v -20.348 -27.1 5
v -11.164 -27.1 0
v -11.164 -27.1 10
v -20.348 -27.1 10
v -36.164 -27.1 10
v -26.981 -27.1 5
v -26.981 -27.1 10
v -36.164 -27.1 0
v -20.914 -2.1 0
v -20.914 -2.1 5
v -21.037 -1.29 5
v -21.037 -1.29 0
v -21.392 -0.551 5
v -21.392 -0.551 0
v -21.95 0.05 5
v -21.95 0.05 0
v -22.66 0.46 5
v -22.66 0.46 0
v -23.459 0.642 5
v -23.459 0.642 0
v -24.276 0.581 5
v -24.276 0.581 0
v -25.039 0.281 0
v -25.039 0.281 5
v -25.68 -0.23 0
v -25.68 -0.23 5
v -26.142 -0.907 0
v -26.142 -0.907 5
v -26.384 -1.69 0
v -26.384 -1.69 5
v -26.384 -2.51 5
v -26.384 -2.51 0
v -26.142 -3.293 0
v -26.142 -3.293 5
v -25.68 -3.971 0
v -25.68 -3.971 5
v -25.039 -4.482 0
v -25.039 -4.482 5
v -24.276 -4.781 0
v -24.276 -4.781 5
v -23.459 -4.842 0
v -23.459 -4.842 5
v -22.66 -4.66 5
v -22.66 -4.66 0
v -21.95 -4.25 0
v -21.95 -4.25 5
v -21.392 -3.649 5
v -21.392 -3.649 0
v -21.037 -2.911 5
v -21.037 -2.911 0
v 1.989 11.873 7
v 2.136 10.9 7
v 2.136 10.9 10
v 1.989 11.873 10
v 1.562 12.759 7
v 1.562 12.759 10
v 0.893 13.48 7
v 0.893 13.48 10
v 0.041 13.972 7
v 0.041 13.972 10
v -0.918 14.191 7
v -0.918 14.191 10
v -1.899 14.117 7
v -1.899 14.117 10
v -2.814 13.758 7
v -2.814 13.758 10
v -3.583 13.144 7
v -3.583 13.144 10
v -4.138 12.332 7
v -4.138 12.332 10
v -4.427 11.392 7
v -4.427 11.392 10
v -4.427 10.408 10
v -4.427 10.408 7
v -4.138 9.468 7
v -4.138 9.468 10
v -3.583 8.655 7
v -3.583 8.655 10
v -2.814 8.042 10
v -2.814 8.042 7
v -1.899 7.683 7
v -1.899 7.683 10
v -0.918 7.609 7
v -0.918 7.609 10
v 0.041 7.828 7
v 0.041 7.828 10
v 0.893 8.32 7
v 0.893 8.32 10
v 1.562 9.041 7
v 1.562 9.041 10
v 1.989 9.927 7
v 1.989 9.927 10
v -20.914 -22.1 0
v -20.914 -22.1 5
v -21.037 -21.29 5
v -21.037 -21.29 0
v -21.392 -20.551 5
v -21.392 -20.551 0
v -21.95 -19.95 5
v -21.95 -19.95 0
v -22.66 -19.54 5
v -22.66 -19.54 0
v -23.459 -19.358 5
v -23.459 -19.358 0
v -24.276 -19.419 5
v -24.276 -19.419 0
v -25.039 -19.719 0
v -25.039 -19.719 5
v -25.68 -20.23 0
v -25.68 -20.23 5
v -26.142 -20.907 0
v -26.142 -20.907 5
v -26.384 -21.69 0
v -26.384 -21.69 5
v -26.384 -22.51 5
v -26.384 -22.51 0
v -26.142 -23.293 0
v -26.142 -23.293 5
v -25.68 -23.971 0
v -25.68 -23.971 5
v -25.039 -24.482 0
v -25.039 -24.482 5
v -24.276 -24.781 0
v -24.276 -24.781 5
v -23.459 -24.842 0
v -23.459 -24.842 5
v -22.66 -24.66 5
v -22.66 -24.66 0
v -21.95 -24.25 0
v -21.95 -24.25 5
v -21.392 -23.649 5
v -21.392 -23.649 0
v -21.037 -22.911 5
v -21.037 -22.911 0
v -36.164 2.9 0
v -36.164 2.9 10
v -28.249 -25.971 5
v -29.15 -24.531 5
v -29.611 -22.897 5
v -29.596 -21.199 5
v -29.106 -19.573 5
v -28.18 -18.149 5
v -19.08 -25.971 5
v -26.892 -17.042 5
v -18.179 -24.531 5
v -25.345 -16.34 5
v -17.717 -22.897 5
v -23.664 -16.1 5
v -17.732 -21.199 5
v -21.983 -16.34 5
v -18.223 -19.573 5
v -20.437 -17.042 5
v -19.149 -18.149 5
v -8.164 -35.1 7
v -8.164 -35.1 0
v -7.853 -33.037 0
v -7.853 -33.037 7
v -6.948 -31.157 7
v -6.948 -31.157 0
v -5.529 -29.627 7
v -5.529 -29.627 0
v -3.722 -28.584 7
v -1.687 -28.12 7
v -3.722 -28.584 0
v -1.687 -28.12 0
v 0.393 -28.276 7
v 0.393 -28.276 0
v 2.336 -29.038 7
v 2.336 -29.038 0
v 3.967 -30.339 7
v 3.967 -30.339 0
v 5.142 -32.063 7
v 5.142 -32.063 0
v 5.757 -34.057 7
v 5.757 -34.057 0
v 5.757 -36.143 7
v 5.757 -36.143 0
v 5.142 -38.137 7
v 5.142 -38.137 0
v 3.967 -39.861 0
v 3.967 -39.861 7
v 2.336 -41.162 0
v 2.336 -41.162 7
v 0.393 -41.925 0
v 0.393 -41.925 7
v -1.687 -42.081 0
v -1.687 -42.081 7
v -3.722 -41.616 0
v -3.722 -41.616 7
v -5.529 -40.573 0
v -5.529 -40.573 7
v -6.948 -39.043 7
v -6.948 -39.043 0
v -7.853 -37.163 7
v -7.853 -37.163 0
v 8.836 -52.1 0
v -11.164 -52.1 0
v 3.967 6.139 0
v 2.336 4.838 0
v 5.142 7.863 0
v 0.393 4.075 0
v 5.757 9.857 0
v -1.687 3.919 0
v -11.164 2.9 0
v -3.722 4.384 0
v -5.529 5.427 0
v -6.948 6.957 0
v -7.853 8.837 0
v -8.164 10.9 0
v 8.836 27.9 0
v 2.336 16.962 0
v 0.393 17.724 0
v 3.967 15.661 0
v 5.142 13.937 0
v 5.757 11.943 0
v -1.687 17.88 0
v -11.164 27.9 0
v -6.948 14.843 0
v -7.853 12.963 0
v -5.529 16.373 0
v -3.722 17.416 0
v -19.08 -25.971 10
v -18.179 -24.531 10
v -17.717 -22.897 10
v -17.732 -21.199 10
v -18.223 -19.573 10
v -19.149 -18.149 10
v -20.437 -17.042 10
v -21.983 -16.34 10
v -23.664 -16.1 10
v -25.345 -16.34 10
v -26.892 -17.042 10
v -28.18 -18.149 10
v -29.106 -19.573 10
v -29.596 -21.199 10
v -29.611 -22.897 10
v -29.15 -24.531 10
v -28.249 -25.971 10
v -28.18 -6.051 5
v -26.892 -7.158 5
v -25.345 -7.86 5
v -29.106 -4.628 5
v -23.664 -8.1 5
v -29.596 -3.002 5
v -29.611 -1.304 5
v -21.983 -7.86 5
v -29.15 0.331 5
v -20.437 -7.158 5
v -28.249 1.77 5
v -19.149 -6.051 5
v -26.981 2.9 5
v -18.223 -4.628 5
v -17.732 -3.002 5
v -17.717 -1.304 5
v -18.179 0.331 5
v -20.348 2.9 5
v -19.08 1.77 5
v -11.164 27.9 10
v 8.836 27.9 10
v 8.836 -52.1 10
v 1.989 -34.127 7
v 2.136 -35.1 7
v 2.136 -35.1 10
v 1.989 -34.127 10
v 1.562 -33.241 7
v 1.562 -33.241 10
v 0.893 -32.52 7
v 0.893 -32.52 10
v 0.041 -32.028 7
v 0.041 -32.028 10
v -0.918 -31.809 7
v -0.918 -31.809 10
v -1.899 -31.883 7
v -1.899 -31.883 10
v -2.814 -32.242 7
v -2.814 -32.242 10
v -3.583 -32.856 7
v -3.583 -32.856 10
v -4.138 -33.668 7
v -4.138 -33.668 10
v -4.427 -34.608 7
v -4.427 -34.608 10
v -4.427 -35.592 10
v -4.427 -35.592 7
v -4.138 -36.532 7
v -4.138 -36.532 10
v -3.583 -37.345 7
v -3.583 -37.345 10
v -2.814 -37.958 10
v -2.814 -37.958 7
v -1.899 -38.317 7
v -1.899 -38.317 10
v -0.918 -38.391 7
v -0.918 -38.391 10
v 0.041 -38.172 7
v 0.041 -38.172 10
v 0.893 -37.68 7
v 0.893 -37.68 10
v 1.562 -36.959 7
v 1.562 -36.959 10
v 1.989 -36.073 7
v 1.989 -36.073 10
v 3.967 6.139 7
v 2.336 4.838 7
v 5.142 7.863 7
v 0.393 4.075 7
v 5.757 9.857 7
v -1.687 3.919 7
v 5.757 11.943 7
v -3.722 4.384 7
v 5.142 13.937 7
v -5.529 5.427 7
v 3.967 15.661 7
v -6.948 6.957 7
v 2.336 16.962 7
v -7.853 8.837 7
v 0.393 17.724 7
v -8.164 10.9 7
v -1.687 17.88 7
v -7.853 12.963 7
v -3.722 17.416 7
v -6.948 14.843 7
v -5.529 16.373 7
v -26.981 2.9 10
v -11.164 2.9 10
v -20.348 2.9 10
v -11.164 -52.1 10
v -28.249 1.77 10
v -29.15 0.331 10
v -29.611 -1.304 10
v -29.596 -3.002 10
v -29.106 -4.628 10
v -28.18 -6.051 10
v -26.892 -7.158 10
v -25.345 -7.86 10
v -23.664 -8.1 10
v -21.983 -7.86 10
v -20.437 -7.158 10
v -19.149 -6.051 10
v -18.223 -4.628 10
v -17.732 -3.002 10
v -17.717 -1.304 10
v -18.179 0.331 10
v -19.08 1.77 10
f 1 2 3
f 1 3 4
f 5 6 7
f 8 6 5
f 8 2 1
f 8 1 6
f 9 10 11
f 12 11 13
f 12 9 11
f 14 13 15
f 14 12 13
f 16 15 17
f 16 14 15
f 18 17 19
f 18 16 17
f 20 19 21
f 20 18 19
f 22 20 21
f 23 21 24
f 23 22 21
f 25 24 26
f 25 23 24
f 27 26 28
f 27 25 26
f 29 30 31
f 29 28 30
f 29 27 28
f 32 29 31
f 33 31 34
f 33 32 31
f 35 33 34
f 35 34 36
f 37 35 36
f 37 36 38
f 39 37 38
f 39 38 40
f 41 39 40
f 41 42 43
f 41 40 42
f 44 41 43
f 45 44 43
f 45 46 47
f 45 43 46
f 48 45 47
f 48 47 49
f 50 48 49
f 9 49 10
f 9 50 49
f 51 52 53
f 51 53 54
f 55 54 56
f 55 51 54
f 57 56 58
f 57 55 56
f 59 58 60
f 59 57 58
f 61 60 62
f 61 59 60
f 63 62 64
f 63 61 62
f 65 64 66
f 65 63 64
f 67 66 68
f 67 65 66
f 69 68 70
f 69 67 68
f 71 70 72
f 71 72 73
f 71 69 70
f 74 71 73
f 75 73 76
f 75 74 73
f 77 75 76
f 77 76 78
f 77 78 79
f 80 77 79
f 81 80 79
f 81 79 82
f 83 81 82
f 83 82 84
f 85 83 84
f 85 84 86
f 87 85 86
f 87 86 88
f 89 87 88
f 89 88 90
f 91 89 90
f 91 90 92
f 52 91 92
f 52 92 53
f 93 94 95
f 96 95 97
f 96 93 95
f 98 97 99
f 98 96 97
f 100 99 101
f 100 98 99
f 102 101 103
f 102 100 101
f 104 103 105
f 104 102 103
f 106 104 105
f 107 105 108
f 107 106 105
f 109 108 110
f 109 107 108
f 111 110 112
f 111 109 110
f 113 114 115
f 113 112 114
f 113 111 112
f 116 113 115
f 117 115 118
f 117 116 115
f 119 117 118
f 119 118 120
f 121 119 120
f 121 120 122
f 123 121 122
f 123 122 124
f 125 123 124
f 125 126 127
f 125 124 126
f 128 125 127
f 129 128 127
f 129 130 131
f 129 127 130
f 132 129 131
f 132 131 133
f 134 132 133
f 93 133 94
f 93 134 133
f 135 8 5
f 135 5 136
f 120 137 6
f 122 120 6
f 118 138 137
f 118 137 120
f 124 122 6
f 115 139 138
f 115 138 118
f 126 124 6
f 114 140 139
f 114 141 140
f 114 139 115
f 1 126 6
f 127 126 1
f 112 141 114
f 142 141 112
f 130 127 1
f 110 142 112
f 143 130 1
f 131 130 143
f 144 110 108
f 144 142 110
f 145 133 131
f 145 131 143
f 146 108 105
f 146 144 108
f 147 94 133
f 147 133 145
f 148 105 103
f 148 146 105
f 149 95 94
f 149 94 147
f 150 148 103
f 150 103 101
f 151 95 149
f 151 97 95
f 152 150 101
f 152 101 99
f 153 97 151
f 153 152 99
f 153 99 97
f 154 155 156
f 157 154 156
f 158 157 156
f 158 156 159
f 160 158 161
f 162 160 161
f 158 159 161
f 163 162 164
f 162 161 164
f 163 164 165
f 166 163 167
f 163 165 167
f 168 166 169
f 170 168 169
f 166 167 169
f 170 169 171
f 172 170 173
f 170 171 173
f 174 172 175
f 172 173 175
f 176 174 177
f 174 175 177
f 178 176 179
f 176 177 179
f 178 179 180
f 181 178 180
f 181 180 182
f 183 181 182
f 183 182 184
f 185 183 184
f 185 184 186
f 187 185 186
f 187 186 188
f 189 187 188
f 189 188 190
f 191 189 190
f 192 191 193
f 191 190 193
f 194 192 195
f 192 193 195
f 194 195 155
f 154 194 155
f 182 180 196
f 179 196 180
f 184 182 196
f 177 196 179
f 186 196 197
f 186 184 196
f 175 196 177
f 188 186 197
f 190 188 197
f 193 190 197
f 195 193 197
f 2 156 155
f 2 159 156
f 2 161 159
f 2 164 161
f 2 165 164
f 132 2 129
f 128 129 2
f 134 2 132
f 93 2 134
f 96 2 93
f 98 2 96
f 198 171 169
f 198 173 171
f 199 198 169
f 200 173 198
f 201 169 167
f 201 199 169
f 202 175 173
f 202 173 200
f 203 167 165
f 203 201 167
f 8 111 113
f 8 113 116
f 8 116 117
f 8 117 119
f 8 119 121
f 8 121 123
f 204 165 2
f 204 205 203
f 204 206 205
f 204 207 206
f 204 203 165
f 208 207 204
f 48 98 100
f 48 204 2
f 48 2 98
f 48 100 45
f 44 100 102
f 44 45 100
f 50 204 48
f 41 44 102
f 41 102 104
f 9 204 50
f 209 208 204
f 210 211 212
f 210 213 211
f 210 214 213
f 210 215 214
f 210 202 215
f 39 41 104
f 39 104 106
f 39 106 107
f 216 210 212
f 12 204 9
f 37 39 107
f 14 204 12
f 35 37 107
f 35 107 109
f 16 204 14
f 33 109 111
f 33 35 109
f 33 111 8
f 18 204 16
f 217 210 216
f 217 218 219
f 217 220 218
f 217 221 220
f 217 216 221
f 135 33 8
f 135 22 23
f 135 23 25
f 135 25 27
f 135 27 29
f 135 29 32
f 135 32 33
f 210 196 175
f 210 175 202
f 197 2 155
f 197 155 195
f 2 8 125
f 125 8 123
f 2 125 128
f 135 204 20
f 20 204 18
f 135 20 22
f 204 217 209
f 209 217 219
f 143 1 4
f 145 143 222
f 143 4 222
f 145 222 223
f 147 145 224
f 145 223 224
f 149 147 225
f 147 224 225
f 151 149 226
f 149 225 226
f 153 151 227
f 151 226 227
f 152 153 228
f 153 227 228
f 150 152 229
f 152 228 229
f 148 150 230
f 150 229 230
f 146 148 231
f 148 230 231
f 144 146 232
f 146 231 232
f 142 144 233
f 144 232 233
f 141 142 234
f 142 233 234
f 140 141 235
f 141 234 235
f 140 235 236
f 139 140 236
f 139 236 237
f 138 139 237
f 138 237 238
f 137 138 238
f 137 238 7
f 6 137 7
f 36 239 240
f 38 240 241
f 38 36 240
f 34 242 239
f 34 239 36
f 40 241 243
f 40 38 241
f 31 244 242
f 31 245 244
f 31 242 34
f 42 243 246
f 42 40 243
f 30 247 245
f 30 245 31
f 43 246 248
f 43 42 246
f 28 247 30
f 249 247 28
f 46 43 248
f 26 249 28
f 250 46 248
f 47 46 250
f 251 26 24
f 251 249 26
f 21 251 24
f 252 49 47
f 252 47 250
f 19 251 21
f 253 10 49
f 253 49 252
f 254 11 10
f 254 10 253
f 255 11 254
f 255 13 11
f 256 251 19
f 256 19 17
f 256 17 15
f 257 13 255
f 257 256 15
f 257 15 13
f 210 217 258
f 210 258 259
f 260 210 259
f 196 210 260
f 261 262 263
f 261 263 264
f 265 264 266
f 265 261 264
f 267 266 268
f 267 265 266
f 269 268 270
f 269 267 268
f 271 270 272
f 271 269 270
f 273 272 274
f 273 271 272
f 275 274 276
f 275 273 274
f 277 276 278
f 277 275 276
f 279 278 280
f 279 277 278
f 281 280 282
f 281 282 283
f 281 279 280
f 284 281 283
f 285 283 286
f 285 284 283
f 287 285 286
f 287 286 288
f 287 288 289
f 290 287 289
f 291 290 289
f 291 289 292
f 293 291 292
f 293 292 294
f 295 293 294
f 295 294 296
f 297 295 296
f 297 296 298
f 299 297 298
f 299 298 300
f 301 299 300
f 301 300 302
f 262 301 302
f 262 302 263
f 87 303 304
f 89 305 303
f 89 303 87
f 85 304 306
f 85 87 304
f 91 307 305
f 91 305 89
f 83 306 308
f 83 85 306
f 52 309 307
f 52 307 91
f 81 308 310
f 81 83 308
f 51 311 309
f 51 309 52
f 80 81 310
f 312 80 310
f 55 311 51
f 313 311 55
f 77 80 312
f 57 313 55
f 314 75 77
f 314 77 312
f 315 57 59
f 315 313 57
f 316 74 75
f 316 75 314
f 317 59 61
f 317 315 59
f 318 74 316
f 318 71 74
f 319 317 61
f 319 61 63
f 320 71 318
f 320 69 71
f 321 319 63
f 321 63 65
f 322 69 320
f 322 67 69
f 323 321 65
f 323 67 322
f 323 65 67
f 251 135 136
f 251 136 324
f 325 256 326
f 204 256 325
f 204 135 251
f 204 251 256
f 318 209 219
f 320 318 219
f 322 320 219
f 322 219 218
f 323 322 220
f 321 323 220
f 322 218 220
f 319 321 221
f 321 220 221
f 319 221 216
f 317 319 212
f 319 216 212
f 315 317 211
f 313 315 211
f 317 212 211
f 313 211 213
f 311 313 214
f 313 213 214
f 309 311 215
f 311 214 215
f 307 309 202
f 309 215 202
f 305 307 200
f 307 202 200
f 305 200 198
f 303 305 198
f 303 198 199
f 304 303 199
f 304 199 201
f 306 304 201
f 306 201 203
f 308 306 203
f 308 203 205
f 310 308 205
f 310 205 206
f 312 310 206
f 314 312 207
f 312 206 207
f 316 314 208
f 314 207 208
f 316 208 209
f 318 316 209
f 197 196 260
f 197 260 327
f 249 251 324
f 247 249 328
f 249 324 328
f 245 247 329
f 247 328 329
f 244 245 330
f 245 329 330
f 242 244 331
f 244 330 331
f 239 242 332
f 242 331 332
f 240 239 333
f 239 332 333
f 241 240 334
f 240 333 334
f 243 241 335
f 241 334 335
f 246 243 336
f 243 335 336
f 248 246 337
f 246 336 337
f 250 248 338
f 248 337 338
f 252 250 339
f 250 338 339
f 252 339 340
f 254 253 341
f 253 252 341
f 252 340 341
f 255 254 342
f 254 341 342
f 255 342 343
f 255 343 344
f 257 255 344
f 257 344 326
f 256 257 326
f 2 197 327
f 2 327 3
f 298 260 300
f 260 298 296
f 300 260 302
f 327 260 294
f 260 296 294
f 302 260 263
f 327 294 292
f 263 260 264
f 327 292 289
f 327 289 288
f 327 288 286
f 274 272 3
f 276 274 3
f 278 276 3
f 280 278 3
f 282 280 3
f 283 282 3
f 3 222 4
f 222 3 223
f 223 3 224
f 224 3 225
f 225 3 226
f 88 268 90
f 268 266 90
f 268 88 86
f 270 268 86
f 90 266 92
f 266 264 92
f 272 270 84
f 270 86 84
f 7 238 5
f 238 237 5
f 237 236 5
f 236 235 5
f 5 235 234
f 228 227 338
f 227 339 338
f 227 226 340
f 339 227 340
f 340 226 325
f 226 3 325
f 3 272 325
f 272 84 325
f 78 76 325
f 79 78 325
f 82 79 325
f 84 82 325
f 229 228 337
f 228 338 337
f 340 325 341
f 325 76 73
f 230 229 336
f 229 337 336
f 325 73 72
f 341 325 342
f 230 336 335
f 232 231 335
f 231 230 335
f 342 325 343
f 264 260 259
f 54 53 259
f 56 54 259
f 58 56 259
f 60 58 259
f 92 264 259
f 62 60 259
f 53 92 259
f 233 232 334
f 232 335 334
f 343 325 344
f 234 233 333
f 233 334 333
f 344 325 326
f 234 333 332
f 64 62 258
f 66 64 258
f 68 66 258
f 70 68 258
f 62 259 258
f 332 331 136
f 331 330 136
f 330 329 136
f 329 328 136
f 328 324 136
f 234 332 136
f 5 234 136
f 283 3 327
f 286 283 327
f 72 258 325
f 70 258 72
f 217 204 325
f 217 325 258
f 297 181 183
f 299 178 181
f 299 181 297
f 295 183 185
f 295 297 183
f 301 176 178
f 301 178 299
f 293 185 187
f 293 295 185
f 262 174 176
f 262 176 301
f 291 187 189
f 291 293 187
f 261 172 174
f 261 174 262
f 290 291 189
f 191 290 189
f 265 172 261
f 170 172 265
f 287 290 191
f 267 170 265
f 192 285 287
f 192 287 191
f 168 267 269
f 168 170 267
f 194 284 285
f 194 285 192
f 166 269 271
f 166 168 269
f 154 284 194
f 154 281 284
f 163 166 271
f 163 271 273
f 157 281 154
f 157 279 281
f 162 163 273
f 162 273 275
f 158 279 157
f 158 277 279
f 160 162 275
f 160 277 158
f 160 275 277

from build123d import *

# Parameters (mm, degrees)
ESQUISSE1_R             = 3.3
ESQUISSE1_R_2           = 2.75
BOSS_EXTRU_1_DEPTH      = 10
ESQUISSE2_R             = 6
ENL_V_MAT_EXTRU_1_DEPTH = 5
ESQUISSE3_R             = 7
ENL_V_MAT_EXTRU_3_DEPTH = 7


with BuildPart() as part:
    # Esquisse1 → Boss.-Extru.1 (new body)
    with BuildSketch(Plane.XY):
        Polygon((8.835664484, 27.89983396), (8.835664484, -52.10016604), (-11.164335516, -52.10016604), (-11.164335516, -27.10016604), (-36.164335516, -27.10016604), (-36.164335516, 2.89983396), (-11.164335516, 2.89983396), (-11.164335516, 27.89983396), align=None)
        with Locations((-1.164335516, 10.89983396)):
            Circle(ESQUISSE1_R, mode=Mode.SUBTRACT)
        with Locations((-1.164335516, -35.10016604)):
            Circle(ESQUISSE1_R, mode=Mode.SUBTRACT)
        with Locations((-23.664335516, -2.10016604)):
            Circle(ESQUISSE1_R_2, mode=Mode.SUBTRACT)
        with Locations((-23.664335516, -22.10016604)):
            Circle(ESQUISSE1_R_2, mode=Mode.SUBTRACT)
    extrude(amount=BOSS_EXTRU_1_DEPTH)

    # Esquisse2 → Enlèv. mat.-Extru.1 (cut)
    with BuildSketch(Plane.XY.offset(10)):
        with Locations((-23.664335516, -2.10016604)):
            Circle(ESQUISSE2_R)
        with Locations((-23.664335516, -22.10016604)):
            Circle(ESQUISSE2_R)
    extrude(amount=-ENL_V_MAT_EXTRU_1_DEPTH, mode=Mode.SUBTRACT)

    # Esquisse3 → Enlèv. mat.-Extru.3 (cut)
    with BuildSketch(Plane(origin=(0, 0, 0), x_dir=(-1, 0, 0), z_dir=(0, 0, -1))):
        with Locations((1.164335516, 10.89983396)):
            Circle(ESQUISSE3_R)
        with Locations((1.164335516, -35.10016604)):
            Circle(ESQUISSE3_R)
    extrude(amount=-ENL_V_MAT_EXTRU_3_DEPTH, mode=Mode.SUBTRACT)


solid = part.part
